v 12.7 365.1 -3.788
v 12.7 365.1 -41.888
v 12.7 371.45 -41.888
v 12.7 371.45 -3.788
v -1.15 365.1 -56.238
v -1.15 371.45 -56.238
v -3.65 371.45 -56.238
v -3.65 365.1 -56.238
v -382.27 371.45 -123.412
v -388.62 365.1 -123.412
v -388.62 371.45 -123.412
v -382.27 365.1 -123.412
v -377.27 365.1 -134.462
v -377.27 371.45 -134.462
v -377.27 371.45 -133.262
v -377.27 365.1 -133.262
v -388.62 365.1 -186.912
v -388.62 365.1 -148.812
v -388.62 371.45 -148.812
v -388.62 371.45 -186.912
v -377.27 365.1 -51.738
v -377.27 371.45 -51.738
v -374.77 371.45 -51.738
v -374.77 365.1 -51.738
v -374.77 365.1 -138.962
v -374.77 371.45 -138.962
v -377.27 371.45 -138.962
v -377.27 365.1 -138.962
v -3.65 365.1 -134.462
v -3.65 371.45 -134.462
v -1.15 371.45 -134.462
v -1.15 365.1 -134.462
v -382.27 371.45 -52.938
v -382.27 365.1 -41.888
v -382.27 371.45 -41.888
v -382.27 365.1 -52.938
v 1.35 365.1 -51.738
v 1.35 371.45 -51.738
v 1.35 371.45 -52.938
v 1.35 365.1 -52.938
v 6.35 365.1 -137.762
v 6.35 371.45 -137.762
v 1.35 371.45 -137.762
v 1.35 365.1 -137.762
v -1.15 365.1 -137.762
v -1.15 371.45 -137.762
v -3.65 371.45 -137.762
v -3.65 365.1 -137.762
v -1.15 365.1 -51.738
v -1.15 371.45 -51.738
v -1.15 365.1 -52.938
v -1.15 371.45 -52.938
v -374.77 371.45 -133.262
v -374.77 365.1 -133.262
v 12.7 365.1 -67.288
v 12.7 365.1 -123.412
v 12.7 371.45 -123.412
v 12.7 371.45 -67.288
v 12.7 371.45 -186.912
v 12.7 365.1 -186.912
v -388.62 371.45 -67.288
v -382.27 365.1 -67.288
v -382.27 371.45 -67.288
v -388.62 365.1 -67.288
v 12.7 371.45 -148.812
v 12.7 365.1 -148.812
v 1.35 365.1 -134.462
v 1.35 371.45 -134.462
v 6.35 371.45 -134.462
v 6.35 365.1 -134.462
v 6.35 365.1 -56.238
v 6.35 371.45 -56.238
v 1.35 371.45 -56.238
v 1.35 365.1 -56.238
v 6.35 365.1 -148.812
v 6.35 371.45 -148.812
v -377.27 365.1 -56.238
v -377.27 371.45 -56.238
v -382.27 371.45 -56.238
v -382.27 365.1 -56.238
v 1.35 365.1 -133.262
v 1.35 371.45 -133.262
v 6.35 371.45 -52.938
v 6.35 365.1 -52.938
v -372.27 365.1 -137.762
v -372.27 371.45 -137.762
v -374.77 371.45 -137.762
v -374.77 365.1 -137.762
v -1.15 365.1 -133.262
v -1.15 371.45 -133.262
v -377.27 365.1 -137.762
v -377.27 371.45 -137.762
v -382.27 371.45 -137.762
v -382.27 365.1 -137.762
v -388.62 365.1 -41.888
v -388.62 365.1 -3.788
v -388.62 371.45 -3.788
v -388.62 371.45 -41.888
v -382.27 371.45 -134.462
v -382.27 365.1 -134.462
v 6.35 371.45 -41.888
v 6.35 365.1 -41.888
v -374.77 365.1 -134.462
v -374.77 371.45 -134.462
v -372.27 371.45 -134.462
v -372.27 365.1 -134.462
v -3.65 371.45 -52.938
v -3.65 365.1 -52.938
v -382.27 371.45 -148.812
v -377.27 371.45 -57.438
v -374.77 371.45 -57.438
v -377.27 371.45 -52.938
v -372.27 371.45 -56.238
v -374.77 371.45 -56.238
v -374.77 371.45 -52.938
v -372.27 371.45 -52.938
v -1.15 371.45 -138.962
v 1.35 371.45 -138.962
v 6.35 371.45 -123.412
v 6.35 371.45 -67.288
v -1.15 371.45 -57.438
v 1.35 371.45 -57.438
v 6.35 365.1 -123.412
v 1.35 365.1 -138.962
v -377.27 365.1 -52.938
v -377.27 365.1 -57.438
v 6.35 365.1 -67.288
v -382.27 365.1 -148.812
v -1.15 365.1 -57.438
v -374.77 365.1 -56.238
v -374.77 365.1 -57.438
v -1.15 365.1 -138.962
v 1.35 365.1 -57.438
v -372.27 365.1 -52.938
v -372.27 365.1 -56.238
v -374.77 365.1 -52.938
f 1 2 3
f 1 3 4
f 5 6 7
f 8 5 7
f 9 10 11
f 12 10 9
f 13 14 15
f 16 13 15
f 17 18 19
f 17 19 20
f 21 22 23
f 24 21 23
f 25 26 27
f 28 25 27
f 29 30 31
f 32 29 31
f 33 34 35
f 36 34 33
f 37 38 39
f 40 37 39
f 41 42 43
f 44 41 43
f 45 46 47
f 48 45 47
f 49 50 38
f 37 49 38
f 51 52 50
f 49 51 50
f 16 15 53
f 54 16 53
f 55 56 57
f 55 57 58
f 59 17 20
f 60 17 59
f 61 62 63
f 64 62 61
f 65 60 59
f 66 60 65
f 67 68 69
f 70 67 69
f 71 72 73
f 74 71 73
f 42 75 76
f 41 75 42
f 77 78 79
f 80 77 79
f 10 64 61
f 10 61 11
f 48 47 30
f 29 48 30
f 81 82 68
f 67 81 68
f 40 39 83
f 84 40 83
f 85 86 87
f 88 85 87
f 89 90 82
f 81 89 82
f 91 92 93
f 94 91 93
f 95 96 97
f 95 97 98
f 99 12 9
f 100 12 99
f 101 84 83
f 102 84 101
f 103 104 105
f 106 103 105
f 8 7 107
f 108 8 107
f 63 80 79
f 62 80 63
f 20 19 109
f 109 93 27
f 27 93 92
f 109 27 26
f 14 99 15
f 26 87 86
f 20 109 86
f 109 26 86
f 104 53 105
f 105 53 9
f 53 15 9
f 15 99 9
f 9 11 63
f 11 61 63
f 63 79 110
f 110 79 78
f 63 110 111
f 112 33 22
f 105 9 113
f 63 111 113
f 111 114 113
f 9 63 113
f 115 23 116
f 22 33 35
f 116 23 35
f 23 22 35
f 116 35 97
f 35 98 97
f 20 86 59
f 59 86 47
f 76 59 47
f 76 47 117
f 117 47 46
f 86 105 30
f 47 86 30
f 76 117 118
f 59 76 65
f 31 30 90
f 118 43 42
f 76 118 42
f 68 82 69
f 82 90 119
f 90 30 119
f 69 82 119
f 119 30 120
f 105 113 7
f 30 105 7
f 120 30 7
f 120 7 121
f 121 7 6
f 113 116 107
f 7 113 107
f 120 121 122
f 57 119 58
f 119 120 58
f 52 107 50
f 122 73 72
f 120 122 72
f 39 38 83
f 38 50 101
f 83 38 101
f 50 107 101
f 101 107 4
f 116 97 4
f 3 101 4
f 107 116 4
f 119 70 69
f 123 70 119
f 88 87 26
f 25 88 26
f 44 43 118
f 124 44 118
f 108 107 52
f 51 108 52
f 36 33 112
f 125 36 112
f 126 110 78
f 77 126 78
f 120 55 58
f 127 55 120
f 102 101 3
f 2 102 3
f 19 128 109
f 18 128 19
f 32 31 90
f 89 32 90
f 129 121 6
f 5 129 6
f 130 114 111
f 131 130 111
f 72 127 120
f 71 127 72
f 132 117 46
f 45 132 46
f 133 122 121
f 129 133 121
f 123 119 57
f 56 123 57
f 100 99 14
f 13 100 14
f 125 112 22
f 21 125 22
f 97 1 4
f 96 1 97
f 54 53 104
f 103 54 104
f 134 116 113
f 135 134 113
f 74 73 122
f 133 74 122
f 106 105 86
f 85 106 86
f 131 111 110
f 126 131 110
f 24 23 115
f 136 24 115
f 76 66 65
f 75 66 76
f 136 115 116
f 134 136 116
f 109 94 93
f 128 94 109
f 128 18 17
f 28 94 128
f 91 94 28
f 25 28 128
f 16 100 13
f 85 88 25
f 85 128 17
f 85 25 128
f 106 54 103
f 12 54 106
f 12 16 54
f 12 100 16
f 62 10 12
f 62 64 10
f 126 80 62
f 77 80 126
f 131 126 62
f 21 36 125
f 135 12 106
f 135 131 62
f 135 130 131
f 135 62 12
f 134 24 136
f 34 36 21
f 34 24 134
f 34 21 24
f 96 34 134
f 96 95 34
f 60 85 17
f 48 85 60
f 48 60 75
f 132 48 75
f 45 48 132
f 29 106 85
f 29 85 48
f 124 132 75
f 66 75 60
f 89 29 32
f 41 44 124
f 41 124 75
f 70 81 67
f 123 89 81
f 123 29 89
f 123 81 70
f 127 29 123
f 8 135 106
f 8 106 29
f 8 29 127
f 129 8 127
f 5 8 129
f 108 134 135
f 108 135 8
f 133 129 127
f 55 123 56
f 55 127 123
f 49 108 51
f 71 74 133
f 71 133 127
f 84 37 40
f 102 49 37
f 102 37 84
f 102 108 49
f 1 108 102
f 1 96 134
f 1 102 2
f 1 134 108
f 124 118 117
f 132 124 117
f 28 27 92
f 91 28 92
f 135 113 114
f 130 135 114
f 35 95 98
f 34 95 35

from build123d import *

# Parameters (mm, degrees)
BOSS_EXTRUDE1_DEPTH = 6.35


with BuildPart() as part:
    # Sketch1 → Boss-Extrude1 (new body)
    with BuildSketch(Plane.XZ.offset(-365.1)):
        Polygon((-388.62, -123.411863322), (-382.27, -123.411863322), (-382.27, -134.461863322), (-377.27, -134.461863322), (-377.27, -133.261863322), (-374.77, -133.261863322), (-374.77, -134.461863322), (-372.27, -134.461863322), (-372.27, -137.761863322), (-374.77, -137.761863322), (-374.77, -138.961863322), (-377.27, -138.961863322), (-377.27, -137.761863322), (-382.27, -137.761863322), (-382.27, -148.811863322), (-388.62, -148.811863322), (-388.62, -186.911863322), (12.7, -186.911863322), (12.7, -148.811863322), (6.35, -148.811863322), (6.35, -137.761863322), (1.35, -137.761863322), (1.35, -138.961863322), (-1.15, -138.961863322), (-1.15, -137.761863322), (-3.65, -137.761863322), (-3.65, -134.461863322), (-1.15, -134.461863322), (-1.15, -133.261863322), (1.35, -133.261863322), (1.35, -134.461863322), (6.35, -134.461863322), (6.35, -123.411863322), (12.7, -123.411863322), (12.7, -67.288281448), (6.35, -67.288281448), (6.35, -56.238281448), (1.35, -56.238281448), (1.35, -57.438281448), (-1.15, -57.438281448), (-1.15, -56.238281448), (-3.65, -56.238281448), (-3.65, -52.938281448), (-1.15, -52.938281448), (-1.15, -51.738281448), (1.35, -51.738281448), (1.35, -52.938281448), (6.35, -52.938281448), (6.35, -41.888281448), (12.7, -41.888281448), (12.7, -3.788281448), (-388.62, -3.788281448), (-388.62, -41.888281448), (-382.27, -41.888281448), (-382.27, -52.938281448), (-377.27, -52.938281448), (-377.27, -51.738281448), (-374.77, -51.738281448), (-374.77, -52.938281448), (-372.27, -52.938281448), (-372.27, -56.238281448), (-374.77, -56.238281448), (-374.77, -57.438281448), (-377.27, -57.438281448), (-377.27, -56.238281448), (-382.27, -56.238281448), (-382.27, -67.288281448), (-388.62, -67.288281448), align=None)
    extrude(amount=-BOSS_EXTRUDE1_DEPTH)


solid = part.part
